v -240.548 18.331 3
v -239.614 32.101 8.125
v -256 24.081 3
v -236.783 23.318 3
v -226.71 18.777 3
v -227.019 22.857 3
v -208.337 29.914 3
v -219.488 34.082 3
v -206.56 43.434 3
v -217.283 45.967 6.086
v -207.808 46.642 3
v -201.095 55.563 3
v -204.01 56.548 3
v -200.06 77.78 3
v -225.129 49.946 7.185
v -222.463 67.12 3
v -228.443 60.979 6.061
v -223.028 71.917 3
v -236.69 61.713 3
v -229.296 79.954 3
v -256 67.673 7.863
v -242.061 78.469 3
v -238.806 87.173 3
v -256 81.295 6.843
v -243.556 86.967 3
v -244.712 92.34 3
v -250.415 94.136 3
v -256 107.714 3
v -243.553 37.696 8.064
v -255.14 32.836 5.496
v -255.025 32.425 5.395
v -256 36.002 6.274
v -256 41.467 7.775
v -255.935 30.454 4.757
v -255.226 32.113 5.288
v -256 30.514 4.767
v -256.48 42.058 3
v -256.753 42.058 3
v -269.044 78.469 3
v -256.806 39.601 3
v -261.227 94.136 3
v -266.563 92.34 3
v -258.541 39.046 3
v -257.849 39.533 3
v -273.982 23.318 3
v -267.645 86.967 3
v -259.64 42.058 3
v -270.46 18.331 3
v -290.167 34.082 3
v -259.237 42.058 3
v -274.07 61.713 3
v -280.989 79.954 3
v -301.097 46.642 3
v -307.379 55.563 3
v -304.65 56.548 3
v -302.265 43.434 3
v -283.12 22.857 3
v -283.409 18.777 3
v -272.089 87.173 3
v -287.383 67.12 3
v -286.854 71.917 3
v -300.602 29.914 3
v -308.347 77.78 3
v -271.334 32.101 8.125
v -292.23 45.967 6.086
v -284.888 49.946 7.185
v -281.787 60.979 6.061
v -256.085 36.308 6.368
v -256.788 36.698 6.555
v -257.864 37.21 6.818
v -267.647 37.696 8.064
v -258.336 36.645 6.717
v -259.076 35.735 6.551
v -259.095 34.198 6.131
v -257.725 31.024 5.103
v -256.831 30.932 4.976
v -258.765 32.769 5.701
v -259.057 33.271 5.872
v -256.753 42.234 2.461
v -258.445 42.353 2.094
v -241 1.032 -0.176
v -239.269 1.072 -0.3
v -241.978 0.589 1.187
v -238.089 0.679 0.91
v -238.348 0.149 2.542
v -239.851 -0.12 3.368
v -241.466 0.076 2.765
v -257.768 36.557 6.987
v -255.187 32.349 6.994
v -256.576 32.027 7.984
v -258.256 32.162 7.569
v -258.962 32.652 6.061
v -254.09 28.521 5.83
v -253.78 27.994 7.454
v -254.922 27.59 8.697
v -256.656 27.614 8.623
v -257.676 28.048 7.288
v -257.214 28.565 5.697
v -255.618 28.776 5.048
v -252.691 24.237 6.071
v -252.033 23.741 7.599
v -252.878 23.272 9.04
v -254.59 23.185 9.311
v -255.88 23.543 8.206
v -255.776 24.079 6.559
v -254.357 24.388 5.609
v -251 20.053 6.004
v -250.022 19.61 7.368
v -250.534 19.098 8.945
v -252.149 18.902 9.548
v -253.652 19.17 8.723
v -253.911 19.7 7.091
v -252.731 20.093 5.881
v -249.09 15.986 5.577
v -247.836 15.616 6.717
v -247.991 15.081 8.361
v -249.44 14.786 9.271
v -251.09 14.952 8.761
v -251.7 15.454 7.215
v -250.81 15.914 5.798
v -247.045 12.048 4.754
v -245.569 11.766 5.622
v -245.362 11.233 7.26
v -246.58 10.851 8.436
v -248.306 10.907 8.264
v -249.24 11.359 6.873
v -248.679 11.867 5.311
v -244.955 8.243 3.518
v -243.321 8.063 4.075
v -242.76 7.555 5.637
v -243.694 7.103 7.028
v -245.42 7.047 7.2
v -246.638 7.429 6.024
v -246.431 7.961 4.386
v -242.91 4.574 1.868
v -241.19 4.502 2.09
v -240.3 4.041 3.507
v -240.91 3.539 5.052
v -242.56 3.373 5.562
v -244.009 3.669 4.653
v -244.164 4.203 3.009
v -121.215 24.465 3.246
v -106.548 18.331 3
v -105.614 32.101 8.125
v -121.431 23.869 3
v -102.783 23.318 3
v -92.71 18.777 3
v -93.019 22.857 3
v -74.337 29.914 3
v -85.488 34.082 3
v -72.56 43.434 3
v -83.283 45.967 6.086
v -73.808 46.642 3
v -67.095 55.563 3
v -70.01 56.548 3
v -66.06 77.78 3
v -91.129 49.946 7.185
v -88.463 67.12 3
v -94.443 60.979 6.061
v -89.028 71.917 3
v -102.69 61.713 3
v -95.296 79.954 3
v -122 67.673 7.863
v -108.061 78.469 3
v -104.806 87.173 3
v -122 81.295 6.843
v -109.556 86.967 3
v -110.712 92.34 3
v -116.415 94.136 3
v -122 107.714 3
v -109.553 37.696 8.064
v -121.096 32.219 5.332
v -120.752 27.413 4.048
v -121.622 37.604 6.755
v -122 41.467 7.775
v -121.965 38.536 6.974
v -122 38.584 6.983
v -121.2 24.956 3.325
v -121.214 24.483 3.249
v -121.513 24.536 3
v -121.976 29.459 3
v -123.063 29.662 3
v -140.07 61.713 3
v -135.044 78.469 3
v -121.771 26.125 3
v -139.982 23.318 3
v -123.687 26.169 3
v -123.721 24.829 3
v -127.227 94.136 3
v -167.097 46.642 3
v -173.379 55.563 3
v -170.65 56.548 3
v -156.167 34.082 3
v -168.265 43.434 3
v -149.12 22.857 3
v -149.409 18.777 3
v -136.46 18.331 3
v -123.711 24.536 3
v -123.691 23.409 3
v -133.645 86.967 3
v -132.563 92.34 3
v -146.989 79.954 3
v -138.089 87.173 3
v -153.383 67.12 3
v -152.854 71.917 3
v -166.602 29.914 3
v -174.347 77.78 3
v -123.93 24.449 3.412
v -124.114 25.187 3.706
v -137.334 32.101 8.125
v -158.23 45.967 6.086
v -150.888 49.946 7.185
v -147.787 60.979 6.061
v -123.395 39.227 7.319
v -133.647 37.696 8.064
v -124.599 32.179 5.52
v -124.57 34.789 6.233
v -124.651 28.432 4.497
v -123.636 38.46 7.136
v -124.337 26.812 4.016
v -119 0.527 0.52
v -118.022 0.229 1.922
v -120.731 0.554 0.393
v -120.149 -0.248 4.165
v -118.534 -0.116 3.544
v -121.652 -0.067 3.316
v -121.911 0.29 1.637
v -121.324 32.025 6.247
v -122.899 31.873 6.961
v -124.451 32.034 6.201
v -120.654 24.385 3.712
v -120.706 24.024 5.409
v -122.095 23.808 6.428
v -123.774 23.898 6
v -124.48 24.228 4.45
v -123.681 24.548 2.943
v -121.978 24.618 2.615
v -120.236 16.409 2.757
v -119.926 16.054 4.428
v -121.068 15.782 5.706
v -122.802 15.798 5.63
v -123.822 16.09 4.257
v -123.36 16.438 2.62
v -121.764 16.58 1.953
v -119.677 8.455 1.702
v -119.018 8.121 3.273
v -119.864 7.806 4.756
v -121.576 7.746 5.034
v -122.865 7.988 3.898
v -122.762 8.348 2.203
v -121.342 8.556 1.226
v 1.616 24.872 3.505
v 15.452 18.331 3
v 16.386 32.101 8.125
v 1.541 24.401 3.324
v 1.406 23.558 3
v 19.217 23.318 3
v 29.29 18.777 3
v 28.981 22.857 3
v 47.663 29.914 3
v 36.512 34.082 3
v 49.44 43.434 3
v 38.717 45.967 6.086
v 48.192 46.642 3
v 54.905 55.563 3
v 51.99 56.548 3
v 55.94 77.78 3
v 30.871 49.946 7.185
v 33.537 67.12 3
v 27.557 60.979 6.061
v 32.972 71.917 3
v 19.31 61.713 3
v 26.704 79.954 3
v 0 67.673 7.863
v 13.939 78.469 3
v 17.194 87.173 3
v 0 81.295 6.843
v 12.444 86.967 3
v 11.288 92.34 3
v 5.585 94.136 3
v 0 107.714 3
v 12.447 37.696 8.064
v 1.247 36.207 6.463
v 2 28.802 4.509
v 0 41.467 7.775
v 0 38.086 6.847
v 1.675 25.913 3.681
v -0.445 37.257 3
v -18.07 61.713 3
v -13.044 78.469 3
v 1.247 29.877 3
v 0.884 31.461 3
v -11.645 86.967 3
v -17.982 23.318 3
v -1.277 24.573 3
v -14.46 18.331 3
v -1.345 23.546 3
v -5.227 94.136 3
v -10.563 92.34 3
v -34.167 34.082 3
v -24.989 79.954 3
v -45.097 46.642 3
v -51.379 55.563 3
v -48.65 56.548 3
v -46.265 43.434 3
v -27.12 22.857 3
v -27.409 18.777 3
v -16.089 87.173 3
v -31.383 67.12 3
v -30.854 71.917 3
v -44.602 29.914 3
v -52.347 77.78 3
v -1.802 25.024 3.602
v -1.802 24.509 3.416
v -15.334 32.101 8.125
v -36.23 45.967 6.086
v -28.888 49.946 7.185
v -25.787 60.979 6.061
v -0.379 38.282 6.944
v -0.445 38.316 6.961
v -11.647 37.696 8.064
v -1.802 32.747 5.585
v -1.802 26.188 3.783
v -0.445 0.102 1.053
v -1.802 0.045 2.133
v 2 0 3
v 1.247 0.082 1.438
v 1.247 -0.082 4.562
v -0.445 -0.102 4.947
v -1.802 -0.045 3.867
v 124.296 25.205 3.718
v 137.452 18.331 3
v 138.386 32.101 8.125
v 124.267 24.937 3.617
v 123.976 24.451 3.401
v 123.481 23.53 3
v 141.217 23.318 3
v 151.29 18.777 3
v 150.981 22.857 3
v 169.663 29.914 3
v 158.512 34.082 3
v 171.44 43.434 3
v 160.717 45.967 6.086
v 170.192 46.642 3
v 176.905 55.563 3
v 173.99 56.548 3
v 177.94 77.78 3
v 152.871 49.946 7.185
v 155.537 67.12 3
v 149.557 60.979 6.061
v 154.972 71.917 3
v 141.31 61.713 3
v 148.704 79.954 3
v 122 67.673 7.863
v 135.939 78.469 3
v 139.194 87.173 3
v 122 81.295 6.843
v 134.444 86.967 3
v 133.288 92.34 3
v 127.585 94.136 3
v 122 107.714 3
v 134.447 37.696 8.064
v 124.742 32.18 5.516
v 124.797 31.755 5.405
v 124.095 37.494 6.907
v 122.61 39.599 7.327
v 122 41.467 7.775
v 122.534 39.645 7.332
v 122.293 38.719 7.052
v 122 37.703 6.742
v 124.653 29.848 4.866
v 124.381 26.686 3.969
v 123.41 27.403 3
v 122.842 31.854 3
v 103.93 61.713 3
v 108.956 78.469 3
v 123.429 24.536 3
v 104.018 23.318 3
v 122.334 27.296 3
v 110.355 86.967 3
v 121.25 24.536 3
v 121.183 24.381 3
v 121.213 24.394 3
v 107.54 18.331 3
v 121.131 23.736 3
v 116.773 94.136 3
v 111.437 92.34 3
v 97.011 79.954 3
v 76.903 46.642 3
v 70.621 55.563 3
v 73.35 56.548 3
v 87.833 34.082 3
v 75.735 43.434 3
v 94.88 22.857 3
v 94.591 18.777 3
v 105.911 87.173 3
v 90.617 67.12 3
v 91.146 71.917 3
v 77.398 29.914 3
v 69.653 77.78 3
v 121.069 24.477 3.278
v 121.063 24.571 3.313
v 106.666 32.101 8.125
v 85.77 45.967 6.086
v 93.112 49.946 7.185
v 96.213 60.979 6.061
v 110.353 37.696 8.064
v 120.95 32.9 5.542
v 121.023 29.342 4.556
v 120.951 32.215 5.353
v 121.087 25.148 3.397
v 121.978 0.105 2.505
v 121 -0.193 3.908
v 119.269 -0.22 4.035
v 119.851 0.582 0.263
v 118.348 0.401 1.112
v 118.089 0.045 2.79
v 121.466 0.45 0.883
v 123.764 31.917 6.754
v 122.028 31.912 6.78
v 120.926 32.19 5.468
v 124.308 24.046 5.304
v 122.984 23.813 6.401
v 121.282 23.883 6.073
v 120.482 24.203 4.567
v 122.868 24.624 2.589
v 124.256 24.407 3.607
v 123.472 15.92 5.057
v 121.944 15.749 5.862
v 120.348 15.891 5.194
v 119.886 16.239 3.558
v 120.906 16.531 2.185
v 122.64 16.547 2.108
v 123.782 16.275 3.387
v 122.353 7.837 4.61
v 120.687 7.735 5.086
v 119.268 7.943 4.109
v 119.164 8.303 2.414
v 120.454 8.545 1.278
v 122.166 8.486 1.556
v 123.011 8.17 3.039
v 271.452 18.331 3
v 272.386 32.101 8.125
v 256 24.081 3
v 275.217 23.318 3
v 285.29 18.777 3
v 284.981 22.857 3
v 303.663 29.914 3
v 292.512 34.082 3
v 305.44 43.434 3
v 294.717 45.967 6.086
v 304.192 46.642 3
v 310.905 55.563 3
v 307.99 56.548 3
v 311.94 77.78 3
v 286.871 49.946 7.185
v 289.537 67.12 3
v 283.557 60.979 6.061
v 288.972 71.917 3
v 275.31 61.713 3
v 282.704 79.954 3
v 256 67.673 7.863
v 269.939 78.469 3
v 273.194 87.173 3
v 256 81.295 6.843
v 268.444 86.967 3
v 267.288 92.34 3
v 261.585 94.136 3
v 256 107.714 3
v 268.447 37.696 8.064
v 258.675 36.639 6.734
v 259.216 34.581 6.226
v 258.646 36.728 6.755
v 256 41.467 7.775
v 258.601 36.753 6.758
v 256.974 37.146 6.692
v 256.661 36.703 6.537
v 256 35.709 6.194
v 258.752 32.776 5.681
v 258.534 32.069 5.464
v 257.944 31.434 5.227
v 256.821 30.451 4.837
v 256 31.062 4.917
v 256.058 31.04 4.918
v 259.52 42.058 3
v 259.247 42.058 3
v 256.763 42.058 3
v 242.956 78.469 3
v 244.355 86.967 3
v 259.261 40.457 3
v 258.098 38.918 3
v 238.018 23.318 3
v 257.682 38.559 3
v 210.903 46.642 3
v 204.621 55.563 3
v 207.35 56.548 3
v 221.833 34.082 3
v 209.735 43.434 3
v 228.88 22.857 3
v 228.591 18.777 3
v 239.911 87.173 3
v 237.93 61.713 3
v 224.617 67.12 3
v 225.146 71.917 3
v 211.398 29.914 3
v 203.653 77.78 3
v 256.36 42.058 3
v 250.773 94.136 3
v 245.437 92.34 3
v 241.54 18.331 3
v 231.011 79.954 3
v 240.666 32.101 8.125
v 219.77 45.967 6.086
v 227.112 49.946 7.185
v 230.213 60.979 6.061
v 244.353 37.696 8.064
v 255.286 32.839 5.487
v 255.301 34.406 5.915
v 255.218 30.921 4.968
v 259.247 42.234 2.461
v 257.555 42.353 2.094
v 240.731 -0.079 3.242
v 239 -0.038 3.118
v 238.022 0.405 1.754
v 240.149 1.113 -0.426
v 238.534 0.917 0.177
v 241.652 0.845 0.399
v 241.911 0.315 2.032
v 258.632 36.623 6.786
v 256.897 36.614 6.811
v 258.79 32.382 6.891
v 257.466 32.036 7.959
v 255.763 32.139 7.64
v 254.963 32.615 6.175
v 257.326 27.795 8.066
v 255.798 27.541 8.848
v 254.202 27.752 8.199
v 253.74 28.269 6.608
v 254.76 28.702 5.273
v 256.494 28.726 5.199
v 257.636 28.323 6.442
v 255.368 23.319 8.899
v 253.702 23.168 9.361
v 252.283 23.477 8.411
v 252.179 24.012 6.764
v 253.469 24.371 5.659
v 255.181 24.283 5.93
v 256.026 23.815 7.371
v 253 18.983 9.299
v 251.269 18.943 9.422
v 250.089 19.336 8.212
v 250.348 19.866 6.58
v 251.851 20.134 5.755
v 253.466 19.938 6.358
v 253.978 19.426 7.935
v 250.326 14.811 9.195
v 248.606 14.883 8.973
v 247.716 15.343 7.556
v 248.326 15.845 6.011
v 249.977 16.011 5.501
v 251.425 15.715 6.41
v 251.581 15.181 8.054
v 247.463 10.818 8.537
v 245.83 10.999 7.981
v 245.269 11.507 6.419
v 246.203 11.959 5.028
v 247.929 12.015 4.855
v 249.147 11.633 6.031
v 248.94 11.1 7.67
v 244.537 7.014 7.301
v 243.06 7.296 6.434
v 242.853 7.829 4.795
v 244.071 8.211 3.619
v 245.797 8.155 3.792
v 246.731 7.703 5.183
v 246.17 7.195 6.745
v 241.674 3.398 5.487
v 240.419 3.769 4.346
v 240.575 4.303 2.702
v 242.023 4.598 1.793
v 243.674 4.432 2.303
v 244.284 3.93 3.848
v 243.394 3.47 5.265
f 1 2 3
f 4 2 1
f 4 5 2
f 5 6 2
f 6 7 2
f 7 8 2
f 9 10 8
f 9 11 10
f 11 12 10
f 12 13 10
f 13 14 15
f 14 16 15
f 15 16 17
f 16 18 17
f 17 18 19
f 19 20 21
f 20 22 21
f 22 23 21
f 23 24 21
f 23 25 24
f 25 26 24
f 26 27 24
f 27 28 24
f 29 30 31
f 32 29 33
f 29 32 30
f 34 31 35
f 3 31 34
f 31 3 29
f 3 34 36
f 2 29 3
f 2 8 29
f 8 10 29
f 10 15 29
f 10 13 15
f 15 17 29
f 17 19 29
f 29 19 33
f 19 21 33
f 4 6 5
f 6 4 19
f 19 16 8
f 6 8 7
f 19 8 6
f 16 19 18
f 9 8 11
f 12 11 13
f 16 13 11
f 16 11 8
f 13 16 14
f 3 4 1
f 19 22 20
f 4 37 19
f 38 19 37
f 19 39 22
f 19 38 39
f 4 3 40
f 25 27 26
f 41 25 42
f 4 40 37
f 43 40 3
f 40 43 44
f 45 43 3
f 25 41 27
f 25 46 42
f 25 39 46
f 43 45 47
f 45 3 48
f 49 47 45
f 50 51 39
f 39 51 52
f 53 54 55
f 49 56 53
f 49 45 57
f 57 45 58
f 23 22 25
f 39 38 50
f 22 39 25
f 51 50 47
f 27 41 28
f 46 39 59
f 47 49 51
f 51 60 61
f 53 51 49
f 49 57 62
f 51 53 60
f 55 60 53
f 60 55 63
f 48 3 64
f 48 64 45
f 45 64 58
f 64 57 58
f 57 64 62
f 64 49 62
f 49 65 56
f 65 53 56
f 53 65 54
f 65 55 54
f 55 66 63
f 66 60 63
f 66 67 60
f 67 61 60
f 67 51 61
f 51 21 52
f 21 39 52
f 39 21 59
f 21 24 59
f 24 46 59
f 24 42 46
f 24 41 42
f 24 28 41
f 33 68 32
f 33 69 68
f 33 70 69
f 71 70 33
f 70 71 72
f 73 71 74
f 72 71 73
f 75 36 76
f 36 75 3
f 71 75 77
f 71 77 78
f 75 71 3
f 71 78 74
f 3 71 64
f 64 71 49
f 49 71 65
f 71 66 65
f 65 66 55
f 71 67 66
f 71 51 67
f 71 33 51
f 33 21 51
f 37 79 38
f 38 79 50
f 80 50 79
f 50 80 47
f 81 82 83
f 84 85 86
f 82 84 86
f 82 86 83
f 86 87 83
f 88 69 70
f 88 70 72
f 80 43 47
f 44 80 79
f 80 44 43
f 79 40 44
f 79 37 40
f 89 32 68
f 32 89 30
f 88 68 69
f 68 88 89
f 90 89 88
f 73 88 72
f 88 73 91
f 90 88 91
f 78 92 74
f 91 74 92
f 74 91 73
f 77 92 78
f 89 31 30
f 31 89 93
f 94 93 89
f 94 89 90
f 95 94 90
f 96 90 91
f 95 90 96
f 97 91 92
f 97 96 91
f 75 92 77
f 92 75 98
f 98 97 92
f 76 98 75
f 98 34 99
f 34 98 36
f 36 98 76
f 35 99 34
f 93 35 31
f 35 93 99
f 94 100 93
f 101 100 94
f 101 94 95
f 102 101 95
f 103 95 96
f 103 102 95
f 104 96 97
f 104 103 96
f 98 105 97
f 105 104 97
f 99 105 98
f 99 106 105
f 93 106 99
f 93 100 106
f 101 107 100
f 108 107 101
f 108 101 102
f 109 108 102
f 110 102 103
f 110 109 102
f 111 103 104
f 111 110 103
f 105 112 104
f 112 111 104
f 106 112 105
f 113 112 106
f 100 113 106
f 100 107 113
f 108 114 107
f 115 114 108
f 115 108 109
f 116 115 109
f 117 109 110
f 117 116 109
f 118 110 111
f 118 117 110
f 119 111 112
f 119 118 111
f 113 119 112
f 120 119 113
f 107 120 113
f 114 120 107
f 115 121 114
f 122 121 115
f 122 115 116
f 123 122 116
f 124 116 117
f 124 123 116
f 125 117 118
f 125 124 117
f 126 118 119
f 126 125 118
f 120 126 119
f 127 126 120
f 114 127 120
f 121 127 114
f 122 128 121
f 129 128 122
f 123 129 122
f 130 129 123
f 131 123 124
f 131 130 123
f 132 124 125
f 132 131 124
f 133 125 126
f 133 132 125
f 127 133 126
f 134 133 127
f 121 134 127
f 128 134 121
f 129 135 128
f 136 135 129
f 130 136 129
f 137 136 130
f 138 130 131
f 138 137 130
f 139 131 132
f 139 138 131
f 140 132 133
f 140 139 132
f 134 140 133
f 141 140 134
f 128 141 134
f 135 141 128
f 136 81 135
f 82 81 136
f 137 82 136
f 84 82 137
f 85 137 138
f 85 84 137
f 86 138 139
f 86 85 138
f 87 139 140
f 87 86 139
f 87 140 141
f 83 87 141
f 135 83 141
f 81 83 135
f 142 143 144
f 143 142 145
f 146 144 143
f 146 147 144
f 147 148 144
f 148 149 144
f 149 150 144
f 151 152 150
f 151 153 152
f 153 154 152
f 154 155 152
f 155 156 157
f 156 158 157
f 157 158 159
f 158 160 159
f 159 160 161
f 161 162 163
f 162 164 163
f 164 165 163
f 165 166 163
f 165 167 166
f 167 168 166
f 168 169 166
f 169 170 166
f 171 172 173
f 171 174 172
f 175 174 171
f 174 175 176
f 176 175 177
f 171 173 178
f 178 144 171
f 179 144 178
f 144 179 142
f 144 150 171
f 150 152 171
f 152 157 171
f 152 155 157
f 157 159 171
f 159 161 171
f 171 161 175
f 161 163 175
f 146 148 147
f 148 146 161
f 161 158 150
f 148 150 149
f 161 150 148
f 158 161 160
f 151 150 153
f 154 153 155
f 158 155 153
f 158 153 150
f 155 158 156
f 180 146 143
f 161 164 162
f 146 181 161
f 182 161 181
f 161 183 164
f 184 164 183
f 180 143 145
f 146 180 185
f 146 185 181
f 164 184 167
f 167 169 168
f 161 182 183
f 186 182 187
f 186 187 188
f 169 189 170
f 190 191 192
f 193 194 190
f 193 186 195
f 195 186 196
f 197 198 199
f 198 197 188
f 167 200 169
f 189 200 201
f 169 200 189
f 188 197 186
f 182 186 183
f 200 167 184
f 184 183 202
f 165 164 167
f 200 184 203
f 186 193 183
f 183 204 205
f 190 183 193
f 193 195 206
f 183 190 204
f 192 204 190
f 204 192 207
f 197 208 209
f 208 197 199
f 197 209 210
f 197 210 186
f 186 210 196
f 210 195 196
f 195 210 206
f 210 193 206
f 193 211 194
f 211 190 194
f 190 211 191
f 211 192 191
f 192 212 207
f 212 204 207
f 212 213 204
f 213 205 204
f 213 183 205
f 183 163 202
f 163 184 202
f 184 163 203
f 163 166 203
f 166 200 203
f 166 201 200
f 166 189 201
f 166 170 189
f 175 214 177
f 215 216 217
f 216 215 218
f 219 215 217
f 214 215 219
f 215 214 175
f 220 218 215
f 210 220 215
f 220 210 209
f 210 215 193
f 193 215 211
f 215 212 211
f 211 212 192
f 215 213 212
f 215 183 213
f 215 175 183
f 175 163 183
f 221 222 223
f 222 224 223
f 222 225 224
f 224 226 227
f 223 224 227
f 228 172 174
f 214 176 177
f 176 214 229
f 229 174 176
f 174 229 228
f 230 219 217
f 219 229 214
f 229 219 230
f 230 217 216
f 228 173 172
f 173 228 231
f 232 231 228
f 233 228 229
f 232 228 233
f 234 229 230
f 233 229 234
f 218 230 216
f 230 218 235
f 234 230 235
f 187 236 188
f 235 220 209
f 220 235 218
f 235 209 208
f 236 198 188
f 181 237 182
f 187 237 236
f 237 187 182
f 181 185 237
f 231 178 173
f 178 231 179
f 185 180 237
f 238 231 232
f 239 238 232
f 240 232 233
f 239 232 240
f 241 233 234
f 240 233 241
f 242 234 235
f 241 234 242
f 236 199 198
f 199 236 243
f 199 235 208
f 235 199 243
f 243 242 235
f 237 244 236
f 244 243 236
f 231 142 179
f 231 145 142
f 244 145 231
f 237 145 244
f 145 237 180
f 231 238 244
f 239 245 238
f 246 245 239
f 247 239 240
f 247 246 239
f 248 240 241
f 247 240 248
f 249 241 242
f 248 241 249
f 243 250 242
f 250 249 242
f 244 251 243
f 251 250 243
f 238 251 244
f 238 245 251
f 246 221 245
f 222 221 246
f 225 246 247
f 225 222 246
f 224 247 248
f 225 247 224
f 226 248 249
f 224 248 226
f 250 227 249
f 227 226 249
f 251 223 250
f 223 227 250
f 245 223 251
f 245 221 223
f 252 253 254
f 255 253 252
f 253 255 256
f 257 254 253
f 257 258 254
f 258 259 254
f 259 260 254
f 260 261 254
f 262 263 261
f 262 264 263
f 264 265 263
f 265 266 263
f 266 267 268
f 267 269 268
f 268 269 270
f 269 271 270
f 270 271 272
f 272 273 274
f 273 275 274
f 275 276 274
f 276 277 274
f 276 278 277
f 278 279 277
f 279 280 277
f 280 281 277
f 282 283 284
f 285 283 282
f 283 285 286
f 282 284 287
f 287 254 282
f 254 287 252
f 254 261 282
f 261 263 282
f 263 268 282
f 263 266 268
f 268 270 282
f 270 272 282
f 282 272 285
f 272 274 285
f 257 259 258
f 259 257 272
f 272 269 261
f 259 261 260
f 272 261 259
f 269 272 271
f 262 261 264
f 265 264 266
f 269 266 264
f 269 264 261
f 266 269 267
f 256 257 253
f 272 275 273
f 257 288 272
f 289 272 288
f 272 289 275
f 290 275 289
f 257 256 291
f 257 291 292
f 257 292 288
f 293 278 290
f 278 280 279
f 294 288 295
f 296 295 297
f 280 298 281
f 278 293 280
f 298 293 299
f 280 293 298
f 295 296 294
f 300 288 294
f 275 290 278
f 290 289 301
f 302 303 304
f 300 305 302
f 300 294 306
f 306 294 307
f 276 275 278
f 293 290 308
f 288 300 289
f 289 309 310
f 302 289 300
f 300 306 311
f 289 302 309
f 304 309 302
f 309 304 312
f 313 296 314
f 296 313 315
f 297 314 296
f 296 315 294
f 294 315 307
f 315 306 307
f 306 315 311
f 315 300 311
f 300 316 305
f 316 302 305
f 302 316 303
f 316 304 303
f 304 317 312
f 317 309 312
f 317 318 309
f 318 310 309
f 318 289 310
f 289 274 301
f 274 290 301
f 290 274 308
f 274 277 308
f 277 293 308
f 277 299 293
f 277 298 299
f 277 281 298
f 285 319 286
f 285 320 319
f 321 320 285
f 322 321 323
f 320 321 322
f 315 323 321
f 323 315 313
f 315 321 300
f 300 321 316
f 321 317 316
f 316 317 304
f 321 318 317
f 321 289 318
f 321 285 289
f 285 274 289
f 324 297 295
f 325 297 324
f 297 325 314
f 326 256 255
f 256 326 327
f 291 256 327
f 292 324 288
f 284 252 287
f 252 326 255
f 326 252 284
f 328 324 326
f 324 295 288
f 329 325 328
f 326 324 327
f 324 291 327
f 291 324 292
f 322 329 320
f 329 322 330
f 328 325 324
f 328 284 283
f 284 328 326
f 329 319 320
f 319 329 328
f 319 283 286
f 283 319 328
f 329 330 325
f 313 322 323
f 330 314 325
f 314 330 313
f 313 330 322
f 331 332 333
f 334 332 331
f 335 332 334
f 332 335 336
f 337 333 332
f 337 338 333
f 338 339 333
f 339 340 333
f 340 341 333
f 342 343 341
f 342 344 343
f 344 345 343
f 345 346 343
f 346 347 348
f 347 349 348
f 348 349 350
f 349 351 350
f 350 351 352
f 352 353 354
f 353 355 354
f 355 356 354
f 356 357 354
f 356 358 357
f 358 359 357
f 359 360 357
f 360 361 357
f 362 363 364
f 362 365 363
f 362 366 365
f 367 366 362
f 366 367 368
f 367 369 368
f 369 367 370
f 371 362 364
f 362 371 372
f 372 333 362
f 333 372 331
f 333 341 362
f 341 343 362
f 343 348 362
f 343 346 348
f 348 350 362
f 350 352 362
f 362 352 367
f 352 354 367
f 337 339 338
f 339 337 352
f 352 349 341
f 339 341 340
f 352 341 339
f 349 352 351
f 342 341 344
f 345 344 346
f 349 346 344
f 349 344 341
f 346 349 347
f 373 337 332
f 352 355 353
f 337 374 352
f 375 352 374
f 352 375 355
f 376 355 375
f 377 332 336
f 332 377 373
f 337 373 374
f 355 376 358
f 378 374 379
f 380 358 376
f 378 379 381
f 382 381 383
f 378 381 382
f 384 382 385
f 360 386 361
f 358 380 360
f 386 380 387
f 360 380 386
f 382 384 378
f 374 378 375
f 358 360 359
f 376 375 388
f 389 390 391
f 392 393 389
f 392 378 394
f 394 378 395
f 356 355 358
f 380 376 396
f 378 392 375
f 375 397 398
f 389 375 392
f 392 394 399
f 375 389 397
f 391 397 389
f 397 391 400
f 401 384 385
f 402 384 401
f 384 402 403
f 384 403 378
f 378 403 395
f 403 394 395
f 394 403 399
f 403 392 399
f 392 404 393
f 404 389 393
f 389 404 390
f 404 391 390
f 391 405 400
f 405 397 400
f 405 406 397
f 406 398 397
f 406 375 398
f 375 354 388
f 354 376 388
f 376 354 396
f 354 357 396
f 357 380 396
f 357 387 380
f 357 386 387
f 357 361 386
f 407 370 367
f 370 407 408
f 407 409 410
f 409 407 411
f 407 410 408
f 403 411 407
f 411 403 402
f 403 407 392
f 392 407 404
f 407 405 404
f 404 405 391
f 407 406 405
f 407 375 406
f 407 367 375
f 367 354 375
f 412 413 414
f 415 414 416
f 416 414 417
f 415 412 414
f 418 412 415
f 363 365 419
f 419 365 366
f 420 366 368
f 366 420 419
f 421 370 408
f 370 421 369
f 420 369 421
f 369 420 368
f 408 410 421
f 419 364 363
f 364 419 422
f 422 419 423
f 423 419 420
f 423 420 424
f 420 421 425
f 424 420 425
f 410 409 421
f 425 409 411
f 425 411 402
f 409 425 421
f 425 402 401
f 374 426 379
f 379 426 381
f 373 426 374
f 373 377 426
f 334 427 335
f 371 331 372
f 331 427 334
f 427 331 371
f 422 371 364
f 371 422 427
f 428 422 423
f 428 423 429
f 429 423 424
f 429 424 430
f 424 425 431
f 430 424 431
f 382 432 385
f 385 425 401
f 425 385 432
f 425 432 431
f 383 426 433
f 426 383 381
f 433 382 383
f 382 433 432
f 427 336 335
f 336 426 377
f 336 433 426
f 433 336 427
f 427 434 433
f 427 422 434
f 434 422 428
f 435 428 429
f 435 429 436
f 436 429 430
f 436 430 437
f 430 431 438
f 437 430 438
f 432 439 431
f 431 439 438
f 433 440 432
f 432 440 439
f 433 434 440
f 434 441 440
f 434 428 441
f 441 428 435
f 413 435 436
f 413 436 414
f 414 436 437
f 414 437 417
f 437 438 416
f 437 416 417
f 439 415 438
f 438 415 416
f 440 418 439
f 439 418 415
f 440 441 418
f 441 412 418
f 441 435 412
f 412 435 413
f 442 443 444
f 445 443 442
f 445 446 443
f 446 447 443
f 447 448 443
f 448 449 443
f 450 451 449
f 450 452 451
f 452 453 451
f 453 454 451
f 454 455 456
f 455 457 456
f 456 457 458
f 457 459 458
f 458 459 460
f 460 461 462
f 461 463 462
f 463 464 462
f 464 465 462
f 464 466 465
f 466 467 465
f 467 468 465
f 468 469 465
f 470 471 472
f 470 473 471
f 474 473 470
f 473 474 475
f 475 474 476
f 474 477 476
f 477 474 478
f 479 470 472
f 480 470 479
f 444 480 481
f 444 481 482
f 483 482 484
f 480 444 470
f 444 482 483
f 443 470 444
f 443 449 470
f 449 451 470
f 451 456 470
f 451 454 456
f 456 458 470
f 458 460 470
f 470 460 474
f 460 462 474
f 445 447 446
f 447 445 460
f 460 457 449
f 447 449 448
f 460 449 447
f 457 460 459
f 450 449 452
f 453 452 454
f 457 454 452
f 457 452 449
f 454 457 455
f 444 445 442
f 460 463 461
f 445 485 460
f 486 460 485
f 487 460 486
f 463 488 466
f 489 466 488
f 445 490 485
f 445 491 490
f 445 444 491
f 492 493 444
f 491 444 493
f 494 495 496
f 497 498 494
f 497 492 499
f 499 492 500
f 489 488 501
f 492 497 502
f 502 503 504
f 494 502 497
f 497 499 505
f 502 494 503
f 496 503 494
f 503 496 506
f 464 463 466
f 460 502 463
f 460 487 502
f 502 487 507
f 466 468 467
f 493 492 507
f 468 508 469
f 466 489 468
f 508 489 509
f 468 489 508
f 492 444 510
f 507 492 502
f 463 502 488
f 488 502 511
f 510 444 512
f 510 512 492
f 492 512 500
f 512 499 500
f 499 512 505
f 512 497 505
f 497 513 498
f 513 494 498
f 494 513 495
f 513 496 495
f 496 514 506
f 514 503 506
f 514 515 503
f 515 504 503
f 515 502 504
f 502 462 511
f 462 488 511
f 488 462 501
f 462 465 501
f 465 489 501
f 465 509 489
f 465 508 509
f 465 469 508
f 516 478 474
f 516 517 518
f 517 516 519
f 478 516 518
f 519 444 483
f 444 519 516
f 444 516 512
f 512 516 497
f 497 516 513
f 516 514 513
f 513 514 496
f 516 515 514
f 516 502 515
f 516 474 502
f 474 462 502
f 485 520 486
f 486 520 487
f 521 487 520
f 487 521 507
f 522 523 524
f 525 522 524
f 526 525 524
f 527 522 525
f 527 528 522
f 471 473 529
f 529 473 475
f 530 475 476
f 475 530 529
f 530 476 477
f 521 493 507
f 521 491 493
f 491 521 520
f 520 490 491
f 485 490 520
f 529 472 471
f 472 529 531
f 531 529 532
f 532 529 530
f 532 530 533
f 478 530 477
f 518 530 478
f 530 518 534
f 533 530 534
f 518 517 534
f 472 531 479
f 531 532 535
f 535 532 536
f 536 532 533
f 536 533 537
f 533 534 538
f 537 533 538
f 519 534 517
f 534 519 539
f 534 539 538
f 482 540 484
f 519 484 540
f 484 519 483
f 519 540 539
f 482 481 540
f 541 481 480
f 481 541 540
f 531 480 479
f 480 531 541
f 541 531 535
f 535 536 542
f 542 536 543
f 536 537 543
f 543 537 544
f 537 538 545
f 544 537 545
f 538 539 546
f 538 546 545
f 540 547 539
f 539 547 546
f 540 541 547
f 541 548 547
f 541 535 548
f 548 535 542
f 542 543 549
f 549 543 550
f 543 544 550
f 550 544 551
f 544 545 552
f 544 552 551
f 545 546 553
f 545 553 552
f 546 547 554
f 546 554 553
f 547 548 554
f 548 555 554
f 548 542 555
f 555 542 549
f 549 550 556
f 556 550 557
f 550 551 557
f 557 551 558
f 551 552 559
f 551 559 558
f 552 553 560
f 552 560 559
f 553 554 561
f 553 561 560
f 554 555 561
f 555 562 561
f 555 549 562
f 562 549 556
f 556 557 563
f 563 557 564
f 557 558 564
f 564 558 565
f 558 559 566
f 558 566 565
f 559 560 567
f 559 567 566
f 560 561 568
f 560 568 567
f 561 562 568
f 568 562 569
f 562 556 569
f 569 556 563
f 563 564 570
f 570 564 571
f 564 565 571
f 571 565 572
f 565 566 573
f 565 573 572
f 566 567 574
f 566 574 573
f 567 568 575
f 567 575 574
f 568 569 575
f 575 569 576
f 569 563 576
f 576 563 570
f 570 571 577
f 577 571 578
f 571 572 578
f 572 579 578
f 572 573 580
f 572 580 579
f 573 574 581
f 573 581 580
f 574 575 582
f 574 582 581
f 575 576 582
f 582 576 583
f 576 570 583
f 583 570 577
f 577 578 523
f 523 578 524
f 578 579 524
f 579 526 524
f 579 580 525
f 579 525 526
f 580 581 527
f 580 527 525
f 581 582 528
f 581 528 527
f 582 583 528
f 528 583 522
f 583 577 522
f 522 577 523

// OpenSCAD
// file: leaf_copy.scad
leafThickness = 5;
leafOffset = 3;
debug = 0;
function maplePoints() = [[  0.0,-50.0,  0.0],    //0
                [  2,-45.0,  0.0],    //1
                [  0,-24.3,  0.0],    //2
                [ 13.2,-29.7,  0.0],    //3
                [ 16.3,-27.2,  0.0],    //4
                [ 25.9,-30.0,  0.0],    //5
                [ 26.1,-27.5,  0.0],    //6
                [ 40.1,-19.7,  0.0],    //7
                [ 31.0,-15.8,  0.0],    //8
                [ 44.8, -7.9,  0.0],    //9
                [ 40.0, -5.2,  0.0],    //10
                [ 48.2,  2.7,  0.0],    //11
                [ 43.1,  3.5,  0.0],    //12
                [ 50.0, 23.2,  0.0],    //13
                [ 29.4, 12.6,  0.0],    //14
                [ 29.6, 16.9,  0.0],    //15
                [ 17.3,  8.4,  0.0],    //16
                [ 23.9, 24.9,  0.0],    //17
                [ 11.9, 23.4,  0.0],    //18
                [ 15.0, 31.8,  0.0],    //19
                [ 10.8, 31.8,  0.0],    //20
                [ 10.0, 36.6,  0.0],    //21
                [  5.0, 36.1,  0.0],    //22
                [  0.0, 50.0,  0.0],    //23
                [ 11.2,-14.0,  5.0],    //24
                [ 33.8, -5.7,  3.0],    //25
                [ 27.7, -2.3,  4.0],    //26
                [ 24.7,  7.5,  3.0],    //27
                [  0.0, -9.7,  5.0],    //28
                [  0.0, 13.3,  5.0],    //29
                [  0.0, 24.7,  4.0],    //30
                [ 14.5,-18.5,  5.0],    //31
                ];
function mapleFaces() = [ [  31,3,  2],           // A
               [   4,3, 31],           // B
               [   5,4, 31],           // C
               [   6,5, 31],           // D
               [   7,6, 31],           // E
               [   8,7, 31],           // F
               [   9,8, 25],           // G
               [  10,9, 25],           // H
               [  11,10, 25],           // I
               [  12,11, 25],           // J
               [  13,12, 26],           // K
               [  14,13, 26],           // L
               [  14,26, 27],           // M
               [  15,14, 27],           // N
               [  15, 27, 16],           // O
               [  17, 16, 29],           // P
               [  18, 17, 29],           // Q
               [  19, 18, 29],           // R
               [  19, 29, 30],           // S
               [  20, 19, 30],           // T
               [  21, 20, 30],           // U
               [  21, 30, 22],           // V
               [  22, 30, 23],           // W
               [  24, 2, 28],           // a
               [  31, 2, 24],           // b
               [   8, 31, 24],           // c
               [   8, 24, 25],           // d
               [  25, 24, 26],           // e
               [  25, 26, 12],           // f
               [  26, 24, 27],           // g
               [  24, 16, 27],           // h
               [  24, 28, 16],           // i
               [  16, 28, 29],           // j
               [2,3,4,5,6,7,8,9,10,11,12,13,14,15,16,17,18,19,20,21,22,23],
              [2,23,30,29,28]
               ];                       

function simpleFaces() = [ [ 7, 2,28],           // A
               [13, 7,28],
               [23,13,28],
               [ 2, 7,13,23],
               [ 23,28,2]
               ];



function sig(v)=v>0?1:v<0?-1:0;

module leaf(points,faces,x,y,orientation,seed,bow,XYscale) {
    bow = abs(bow)>2?sign(bow)*2:floor(bow);
    bowSet = [[0,0,0,2],[6,-6,2,8],[12,12,16,12]][abs(bow)];
    mEff = 0.05;//.1;
    sEff = 0.2;//.2;
    rEff = 0.0;
    tEff = 0;
    locPoints = [for(i = [0:len(points)-1])[
        points[i][0]*rands(1-mEff,1+mEff,1,seed+i*3+100)[0],
        points[i][1]*rands(1-mEff,1+mEff,1,seed+i*3+101)[0],
        points[i][2]*rands(1-mEff,1+mEff,1,seed+i*3+102)[0]]];
    translate([x+100*rands(-tEff,+tEff,1,seed+14)[0],y+100*rands(-tEff,+tEff,1,seed+13)[0],leafOffset]) 
        scale([XYscale,XYscale,leafThickness/5])
            rotate([0,0,orientation+100*rands(-rEff,+rEff,1,seed+12)[0]])
            union(){
               translate([sig(bow)*bowSet[1]/2,0,0])
               rotate([90+1.5*bowSet[3],0,0])
               translate([0, -bowSet[0], -20])
                    linear_extrude(height = 40, center = true, convexity = 10, twist = -sig(bow)*bowSet[0]*10)
                        translate([sig(bow)*bowSet[0], 0, 0])
                            circle(r = 2);
                if (debug == 1)
                    translate([0,0,5])
                        color([1,0,0])
                            cylinder(2,2,2);
               translate([sig(bow)*bowSet[2],0,0])
                   union(){
                   scale([rands(1-sEff,1+sEff,1,seed+20)[0],rands(1-sEff,1+sEff,1,seed+21)[0],1])
                        translate([0,47,0])
                            polyhedron(points=locPoints,faces=faces,convexity = 3);
                   scale([rands(1-sEff,1+sEff,1,seed+22)[0],rands(1-sEff,1+sEff,1,seed+21)[0],1])
                        translate([0,47,0])
                            mirror([1,0,0])
                                polyhedron(points=locPoints,faces=faces,convexity = 3);
                   }
            }
}
// main file
include <leaf_copy.scad>
module mapleLeaf(x,y,orientation,seed,bow,XYscale) {
     leaf(maplePoints(),mapleFaces(),x,y,orientation,seed,bow,XYscale);
}
module testLeaves(){
    {
    for(x = [-5:1:5])
        for(y = [-5:1:5])
            mapleLeaf(x*120,y*120,0,x*20+y,x+y,1+(x+y)/20);
    }
 }

 mapleLeaf(-240,0,0,0,-2,1);
 mapleLeaf(-120,0,0,0,-1,1);
 mapleLeaf(0,0,0,0,0,1);
 mapleLeaf(120,0,0,0,1,1);
 mapleLeaf(240,0,0,0,2,1);
 //testLeaves();
